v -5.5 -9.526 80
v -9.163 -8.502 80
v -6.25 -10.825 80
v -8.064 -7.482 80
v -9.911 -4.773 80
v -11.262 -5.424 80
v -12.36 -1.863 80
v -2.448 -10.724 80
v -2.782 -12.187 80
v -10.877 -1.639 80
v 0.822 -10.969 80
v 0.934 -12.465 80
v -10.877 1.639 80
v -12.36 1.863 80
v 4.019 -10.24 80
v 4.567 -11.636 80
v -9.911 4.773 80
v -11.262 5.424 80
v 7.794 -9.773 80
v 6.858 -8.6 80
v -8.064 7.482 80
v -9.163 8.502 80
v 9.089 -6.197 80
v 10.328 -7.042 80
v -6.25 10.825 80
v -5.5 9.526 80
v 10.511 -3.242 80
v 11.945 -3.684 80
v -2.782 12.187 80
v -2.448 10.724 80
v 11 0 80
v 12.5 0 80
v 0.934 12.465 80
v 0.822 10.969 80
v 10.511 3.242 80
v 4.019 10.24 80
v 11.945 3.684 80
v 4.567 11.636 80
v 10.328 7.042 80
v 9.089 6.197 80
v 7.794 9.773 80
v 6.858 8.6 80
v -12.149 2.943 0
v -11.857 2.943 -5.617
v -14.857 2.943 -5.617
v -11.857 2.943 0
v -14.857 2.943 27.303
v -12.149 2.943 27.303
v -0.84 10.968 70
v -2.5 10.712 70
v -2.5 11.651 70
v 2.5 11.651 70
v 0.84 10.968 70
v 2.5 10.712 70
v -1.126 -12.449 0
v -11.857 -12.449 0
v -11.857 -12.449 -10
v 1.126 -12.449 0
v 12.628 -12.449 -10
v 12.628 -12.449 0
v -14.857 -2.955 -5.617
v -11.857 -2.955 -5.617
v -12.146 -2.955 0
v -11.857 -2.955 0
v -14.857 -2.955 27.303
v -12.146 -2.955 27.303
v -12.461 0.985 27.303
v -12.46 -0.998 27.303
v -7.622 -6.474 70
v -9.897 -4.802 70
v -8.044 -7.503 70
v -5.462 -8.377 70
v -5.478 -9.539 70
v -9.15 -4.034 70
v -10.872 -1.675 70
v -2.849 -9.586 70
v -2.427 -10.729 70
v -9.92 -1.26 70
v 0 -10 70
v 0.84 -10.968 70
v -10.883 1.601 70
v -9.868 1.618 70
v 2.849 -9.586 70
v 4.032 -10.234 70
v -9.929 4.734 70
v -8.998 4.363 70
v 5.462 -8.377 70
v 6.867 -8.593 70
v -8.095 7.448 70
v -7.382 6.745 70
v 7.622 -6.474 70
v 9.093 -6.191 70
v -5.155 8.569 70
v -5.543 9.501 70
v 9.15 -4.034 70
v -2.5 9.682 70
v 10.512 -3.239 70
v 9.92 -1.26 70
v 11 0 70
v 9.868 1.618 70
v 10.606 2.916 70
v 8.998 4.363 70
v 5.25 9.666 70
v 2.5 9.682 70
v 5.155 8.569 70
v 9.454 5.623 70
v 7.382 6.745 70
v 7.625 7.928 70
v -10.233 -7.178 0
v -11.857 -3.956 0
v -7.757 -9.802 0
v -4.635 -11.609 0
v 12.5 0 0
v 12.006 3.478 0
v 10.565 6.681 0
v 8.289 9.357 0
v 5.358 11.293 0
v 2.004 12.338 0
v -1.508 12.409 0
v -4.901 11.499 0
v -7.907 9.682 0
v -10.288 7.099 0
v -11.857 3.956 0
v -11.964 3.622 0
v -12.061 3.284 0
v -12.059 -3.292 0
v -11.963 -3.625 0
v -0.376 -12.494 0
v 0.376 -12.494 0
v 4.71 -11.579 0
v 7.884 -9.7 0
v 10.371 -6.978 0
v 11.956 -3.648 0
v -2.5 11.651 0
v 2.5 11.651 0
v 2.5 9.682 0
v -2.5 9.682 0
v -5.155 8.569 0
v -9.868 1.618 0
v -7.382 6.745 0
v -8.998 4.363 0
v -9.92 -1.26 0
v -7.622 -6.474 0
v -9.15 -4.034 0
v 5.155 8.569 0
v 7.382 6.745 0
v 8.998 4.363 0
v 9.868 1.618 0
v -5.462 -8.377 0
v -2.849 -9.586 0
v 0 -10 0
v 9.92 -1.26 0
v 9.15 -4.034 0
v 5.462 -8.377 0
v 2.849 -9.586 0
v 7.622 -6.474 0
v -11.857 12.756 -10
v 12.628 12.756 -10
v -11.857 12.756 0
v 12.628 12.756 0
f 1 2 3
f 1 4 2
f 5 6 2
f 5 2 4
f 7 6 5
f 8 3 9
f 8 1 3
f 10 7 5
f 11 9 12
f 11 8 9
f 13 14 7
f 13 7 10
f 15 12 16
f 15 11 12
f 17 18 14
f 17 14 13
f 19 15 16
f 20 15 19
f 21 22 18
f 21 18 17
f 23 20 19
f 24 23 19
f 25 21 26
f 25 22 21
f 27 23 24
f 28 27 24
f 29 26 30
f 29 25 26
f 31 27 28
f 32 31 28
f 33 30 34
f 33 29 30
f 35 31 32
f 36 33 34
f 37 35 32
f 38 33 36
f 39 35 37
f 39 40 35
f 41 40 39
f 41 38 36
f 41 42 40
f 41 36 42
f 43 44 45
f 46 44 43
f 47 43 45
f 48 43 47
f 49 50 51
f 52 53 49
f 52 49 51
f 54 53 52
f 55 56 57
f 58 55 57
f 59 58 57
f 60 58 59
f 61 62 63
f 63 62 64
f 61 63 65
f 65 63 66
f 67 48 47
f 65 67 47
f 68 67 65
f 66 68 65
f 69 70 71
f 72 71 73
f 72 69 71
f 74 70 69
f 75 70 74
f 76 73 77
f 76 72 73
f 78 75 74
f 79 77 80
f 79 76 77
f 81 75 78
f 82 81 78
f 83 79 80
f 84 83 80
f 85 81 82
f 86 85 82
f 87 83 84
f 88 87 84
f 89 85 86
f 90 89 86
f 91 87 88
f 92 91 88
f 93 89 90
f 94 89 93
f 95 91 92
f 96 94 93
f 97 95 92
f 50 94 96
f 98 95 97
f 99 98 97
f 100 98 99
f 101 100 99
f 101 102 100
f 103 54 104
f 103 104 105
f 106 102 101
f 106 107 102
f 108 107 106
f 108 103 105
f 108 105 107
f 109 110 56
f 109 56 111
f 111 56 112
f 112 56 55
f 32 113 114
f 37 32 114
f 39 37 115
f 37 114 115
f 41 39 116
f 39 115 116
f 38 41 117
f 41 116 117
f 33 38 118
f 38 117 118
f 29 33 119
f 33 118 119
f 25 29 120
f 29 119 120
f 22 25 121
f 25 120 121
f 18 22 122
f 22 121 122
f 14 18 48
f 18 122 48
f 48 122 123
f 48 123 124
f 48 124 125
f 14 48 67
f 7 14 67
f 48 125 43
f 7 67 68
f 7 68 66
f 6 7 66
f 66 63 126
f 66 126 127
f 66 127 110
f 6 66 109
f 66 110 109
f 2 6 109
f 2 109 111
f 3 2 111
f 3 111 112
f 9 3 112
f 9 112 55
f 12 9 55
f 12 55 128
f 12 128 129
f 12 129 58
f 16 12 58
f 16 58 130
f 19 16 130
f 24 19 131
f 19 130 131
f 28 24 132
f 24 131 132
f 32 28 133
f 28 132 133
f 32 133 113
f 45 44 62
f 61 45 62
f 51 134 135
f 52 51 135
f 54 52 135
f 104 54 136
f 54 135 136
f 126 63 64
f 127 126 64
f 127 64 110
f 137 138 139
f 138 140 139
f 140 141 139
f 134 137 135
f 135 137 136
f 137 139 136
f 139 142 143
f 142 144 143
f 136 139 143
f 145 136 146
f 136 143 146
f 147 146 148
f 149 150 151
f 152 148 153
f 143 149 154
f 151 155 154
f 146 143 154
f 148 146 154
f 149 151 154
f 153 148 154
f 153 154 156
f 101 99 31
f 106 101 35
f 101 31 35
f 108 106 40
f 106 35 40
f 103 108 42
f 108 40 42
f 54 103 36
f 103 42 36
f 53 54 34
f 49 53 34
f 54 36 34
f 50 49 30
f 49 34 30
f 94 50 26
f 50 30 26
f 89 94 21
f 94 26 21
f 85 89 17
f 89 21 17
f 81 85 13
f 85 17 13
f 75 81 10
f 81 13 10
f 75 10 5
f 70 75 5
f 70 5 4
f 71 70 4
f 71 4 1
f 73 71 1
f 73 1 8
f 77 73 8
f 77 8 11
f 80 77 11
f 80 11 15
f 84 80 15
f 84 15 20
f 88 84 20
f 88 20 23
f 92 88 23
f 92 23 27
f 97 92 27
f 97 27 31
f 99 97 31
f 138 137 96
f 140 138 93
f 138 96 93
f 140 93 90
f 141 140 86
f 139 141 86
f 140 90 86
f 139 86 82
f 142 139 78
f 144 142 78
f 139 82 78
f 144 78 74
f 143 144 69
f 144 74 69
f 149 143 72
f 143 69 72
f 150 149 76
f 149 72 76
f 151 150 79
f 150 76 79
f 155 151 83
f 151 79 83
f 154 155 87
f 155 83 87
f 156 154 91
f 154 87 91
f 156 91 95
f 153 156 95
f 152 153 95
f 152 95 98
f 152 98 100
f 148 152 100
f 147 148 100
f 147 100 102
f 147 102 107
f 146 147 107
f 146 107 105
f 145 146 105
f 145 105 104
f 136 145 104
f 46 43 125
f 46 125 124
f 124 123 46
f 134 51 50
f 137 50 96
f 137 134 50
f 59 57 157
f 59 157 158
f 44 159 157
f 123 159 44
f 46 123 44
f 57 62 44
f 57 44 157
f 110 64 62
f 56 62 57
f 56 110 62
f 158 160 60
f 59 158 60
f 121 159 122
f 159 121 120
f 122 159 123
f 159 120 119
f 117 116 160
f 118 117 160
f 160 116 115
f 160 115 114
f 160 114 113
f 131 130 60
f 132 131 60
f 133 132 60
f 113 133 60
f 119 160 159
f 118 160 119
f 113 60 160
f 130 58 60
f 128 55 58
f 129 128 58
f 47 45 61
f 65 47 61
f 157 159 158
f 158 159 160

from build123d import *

# Parameters (mm, degrees)
SKETCH_R        = 12.5
PAD_DEPTH       = 80
SKETCH001_R     = 11
POCKET_DEPTH    = 10
SKETCH002_R     = 10
POCKET001_DEPTH = 70.001
SKETCH003_W     = 5
SKETCH003_H     = 2
POCKET002_DEPTH = 70
SKETCH004_W     = 24.485672
SKETCH004_H     = 25.205176
PAD001_DEPTH    = 10
SKETCH005_W     = 5.898827
SKETCH005_H     = 32.91927
PAD002_DEPTH    = 3


with BuildPart() as part:
    # Sketch → Pad (new body)
    with BuildSketch(Plane.XY):
        Circle(SKETCH_R)
    extrude(amount=PAD_DEPTH)

    # Sketch001 (on Face3 of Pad) → Pocket (cut)
    with BuildSketch(Plane.XY.offset(80)):
        Circle(SKETCH001_R)
    extrude(amount=-POCKET_DEPTH, mode=Mode.SUBTRACT)

    # Sketch002 (on Face5 of Pocket) → Pocket001 (cut, through all)
    with BuildSketch(Plane.XY.offset(70)):
        Circle(SKETCH002_R)
    extrude(amount=-POCKET001_DEPTH, mode=Mode.SUBTRACT)

    # Sketch003 (on Face2 of Pocket001) → Pocket002 (cut)
    with BuildSketch(Plane(origin=(0, 0, 0), x_dir=(1, 0, 0), z_dir=(0, 0, -1))):
        with Locations((0, -10.651299)):
            Rectangle(SKETCH003_W, SKETCH003_H)
    extrude(amount=-POCKET002_DEPTH, mode=Mode.SUBTRACT)

    # Sketch004 (on Face2 of Pocket002) → Pad001 (join)
    with BuildSketch(Plane(origin=(0, 0, 0), x_dir=(1, 0, 0), z_dir=(0, 0, -1))):
        with Locations((0.385492, -0.153396)):
            Rectangle(SKETCH004_W, SKETCH004_H)
    extrude(amount=PAD001_DEPTH)

    # Sketch005 (on Face7 of Pad001) → Pad002 (join)
    with BuildSketch(Plane(origin=(-11.857344, 0, 0), x_dir=(0, -1, 0), z_dir=(-1, 0, 0))):
        with Locations((0.006047, 10.84297)):
            Rectangle(SKETCH005_W, SKETCH005_H)
    extrude(amount=PAD002_DEPTH)


solid = part.part
